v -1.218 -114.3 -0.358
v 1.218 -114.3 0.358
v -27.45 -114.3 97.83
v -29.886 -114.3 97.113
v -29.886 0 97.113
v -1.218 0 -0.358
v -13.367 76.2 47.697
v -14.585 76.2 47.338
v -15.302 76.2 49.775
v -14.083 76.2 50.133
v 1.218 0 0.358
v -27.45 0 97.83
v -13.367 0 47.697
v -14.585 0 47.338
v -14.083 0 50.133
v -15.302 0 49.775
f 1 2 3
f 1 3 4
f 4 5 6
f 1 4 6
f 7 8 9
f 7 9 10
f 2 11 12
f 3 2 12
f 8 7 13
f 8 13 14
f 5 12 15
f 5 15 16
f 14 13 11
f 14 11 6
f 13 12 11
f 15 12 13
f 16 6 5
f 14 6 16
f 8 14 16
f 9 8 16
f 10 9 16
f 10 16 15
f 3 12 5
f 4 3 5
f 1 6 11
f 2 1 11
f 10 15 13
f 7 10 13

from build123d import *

# Parameters (mm, degrees)
BOSS_EXTRUDE1_DEPTH = 114.3
BOSS_EXTRUDE2_DEPTH = 76.2


with BuildPart() as part:
    # Sketch1 → Boss-Extrude1 (new body)
    with BuildSketch(Plane(origin=(0, 0, 0), x_dir=(1, 0, 0), z_dir=(0, 1, 0))):
        Polygon((-1.218394187, 0.358351231), (1.218394187, -0.358351231), (-27.449704331, -97.829886191), (-29.886492705, -97.113183728), align=None)
    extrude(amount=-BOSS_EXTRUDE1_DEPTH)

    # Sketch2 → Boss-Extrude2 (add)
    with BuildSketch(Plane(origin=(0, 0, 0), x_dir=(1, 0, 0), z_dir=(0, 1, 0))):
        Polygon((-14.584895121, -47.338197677), (-15.301597584, -49.774986051), (-14.083203397, -50.133337283), (-13.366500934, -47.696548909), align=None)
    extrude(amount=BOSS_EXTRUDE2_DEPTH)


solid = part.part
